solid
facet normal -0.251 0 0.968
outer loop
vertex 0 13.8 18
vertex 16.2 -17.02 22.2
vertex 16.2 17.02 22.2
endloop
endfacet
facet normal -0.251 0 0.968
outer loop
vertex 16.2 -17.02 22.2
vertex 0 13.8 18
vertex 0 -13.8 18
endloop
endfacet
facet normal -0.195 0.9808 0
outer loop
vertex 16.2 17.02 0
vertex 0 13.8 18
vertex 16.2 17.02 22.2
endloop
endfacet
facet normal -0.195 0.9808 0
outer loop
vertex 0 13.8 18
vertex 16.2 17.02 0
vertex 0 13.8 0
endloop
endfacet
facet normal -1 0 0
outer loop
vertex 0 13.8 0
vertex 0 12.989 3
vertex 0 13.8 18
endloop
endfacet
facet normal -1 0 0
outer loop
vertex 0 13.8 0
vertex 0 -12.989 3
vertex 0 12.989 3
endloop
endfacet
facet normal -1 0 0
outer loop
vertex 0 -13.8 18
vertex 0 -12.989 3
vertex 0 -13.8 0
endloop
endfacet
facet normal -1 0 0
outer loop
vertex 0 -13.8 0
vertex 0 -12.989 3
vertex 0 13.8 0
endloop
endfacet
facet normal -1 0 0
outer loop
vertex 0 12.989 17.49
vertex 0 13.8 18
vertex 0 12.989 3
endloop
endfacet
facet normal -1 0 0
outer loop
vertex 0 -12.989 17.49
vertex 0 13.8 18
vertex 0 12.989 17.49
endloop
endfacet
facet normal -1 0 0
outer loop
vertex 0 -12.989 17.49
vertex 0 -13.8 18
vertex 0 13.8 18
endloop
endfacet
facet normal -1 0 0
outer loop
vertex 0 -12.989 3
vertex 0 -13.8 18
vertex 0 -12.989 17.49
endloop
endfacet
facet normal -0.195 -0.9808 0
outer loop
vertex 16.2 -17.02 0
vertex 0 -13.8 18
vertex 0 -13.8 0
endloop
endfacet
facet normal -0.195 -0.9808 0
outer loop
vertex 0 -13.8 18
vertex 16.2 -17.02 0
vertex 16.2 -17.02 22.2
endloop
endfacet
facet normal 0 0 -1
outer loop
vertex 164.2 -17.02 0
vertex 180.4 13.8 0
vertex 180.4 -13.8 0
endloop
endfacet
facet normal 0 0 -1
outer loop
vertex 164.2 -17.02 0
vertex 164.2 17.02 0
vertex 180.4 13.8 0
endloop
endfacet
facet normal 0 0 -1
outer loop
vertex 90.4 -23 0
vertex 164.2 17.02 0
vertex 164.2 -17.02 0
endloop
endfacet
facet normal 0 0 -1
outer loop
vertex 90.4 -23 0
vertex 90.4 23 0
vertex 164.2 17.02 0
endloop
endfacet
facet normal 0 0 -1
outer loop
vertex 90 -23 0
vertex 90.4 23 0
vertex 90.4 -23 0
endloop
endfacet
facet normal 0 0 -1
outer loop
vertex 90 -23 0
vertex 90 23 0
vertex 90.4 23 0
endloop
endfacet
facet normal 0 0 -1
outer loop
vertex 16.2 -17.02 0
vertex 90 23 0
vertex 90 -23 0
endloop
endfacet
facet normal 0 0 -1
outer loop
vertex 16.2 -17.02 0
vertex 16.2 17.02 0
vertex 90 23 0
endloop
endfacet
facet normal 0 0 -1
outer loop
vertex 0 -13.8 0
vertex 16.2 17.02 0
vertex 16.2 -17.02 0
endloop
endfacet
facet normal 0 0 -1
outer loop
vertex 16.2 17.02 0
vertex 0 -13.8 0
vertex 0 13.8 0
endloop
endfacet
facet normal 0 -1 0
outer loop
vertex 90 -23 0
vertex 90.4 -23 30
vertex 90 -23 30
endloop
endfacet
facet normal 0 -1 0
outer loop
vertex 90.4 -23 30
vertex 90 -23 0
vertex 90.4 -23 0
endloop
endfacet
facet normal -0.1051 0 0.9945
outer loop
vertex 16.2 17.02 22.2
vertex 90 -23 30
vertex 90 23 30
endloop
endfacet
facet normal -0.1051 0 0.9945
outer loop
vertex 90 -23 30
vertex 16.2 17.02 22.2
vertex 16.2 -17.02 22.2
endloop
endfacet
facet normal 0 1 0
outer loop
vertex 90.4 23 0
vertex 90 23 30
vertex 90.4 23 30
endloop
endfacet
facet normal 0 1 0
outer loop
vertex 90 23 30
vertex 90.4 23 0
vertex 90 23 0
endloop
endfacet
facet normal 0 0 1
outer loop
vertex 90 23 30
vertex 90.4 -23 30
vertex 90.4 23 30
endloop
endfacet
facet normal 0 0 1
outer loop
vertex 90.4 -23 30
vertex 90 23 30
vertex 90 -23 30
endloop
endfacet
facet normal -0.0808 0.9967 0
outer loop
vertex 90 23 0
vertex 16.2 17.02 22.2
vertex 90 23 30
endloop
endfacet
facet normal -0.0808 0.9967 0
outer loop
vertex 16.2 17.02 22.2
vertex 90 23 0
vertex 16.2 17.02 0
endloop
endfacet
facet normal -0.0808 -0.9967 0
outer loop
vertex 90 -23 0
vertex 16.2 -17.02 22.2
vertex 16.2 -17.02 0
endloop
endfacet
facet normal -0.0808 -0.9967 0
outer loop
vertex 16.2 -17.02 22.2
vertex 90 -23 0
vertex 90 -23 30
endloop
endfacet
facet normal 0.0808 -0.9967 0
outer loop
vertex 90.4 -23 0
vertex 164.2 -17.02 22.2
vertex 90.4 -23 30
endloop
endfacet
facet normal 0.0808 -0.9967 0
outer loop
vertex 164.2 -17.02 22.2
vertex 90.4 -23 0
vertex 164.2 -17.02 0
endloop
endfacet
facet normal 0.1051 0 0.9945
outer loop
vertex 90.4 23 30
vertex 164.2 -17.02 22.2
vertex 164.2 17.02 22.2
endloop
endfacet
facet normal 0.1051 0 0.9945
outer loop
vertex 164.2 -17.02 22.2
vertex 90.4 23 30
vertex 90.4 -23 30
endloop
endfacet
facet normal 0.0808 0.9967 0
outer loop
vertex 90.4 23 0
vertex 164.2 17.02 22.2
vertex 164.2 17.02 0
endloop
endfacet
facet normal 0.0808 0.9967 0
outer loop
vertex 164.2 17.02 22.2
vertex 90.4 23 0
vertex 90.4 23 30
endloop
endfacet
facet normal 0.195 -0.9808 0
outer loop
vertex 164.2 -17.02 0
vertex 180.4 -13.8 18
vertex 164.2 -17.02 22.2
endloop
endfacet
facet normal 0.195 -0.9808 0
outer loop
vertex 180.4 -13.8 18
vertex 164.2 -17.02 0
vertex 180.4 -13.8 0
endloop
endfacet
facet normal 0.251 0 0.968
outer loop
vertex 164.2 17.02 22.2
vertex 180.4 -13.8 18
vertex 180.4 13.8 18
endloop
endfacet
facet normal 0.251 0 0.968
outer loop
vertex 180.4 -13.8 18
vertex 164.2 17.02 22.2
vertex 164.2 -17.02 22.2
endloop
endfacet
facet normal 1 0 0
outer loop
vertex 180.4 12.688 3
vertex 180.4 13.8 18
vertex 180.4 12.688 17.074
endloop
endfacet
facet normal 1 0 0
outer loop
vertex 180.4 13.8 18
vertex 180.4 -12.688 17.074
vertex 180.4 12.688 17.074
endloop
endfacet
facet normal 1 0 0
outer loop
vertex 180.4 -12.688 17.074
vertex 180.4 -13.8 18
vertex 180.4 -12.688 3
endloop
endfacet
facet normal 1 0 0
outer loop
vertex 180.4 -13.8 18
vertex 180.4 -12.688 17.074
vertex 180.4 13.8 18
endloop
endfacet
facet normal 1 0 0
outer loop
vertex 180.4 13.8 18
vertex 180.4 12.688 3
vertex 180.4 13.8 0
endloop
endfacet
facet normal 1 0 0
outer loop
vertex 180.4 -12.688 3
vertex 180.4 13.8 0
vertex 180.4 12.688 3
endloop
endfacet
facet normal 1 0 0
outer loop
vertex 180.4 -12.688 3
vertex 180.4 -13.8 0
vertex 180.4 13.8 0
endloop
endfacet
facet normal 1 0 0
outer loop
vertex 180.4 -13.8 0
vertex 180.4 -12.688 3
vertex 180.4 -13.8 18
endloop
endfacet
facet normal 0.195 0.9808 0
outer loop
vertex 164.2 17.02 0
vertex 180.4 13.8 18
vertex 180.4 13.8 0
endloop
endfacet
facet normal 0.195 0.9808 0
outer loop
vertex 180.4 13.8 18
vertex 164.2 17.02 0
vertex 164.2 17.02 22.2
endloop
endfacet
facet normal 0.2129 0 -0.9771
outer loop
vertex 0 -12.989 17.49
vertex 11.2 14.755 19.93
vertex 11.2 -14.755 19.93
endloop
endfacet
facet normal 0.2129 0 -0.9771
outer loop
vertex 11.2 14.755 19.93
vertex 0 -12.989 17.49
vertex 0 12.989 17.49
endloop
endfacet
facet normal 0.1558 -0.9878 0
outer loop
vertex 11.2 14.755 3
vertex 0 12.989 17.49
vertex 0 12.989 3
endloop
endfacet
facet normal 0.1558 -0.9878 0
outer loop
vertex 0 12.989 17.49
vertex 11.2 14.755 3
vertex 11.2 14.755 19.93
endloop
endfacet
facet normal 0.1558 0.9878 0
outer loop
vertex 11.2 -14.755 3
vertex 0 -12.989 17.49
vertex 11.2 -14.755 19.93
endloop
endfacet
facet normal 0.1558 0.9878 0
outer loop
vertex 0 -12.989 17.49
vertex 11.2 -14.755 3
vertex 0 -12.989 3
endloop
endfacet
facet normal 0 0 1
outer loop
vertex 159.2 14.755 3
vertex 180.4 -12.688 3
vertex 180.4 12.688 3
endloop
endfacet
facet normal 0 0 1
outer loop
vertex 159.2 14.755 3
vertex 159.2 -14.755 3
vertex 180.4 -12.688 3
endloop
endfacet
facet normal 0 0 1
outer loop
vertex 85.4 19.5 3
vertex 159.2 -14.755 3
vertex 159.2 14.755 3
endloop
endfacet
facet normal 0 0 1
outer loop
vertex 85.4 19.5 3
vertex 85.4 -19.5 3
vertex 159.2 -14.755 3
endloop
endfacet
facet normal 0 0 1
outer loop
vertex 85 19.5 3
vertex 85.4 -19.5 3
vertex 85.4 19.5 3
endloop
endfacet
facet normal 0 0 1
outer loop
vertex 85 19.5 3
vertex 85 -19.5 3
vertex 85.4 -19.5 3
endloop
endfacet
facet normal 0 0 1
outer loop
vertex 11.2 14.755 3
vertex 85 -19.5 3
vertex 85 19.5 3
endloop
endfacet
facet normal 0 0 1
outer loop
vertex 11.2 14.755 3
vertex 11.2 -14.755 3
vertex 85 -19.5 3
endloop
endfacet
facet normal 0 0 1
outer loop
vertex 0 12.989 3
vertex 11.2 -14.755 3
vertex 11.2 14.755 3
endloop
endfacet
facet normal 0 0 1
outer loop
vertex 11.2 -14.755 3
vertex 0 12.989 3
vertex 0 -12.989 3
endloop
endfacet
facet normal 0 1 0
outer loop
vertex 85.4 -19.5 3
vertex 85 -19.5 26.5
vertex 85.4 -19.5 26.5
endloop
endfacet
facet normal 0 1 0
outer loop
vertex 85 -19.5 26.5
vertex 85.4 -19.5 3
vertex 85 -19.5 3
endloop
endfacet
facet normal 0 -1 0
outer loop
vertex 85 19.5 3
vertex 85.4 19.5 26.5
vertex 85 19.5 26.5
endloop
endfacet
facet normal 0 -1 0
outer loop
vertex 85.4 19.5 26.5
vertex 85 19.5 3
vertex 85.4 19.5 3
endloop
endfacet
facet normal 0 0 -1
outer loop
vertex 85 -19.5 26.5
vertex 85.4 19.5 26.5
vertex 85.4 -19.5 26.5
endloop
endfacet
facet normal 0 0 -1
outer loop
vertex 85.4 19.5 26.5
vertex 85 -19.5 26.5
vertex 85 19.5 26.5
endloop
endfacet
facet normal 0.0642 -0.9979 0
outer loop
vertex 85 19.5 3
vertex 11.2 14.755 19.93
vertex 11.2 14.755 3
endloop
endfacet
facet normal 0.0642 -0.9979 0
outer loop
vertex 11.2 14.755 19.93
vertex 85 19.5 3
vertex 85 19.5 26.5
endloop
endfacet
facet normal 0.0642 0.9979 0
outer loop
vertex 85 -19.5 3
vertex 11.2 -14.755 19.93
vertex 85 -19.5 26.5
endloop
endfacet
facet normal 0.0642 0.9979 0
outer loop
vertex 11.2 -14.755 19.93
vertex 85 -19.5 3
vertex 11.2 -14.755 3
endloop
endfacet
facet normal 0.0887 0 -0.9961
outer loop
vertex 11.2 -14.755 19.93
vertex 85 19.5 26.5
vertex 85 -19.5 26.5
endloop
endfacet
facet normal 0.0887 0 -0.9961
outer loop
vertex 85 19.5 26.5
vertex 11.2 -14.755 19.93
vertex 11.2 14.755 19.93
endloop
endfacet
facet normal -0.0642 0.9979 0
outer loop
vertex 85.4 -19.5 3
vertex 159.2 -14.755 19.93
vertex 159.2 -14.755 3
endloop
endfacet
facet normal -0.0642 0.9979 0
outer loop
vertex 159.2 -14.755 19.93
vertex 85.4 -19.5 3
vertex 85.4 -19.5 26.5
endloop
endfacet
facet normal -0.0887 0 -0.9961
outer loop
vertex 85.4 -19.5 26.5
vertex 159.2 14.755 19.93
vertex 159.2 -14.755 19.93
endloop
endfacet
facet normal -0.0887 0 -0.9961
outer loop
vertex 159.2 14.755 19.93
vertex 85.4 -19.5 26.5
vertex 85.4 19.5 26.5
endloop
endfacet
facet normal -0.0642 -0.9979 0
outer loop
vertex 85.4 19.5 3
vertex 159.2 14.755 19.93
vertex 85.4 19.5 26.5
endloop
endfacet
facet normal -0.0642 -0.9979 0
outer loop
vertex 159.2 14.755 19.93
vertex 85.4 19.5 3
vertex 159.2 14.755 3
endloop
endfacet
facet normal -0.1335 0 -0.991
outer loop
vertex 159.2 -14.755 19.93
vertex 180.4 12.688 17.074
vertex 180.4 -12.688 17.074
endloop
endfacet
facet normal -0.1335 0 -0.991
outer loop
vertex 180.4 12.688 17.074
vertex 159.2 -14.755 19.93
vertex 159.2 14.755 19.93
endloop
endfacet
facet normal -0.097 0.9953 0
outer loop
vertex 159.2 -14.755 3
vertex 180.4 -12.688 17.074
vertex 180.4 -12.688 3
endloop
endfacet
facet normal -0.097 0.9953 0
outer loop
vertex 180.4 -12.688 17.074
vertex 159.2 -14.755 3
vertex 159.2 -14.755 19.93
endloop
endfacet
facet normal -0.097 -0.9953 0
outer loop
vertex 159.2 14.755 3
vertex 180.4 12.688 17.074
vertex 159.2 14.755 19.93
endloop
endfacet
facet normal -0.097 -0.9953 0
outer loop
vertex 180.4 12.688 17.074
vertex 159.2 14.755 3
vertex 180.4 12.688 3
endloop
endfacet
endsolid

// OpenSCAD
$fn = 32;

// ----------------------------------------------------------------------
// Faired channel: 180 x 46 x 30 mm, 3.5 mm walls, faired ends
// ----------------------------------------------------------------------

// --- parameters (mm) ---
length = 180;             // channel length
width = 46;               // channel width at mid length
height = 30;              // channel height at mid length
wall = 3.5;               // side wall thickness
floor_t = 3;              // floor thickness
end_w = 27.6;             // faired end width
end_h = 18;               // faired end height

difference() {
  union() {
    hull() {
      translate([0, -13.8, 0]) cube([0.4, 27.6, 18]);
      translate([16.2, -17.02, 0]) cube([0.4, 34.04, 22.2]);
    }
    hull() {
      translate([16.2, -17.02, 0]) cube([0.4, 34.04, 22.2]);
      translate([90, -23, 0]) cube([0.4, 46, 30]);
    }
    hull() {
      translate([90, -23, 0]) cube([0.4, 46, 30]);
      translate([163.8, -17.02, 0]) cube([0.4, 34.04, 22.2]);
    }
    hull() {
      translate([163.8, -17.02, 0]) cube([0.4, 34.04, 22.2]);
      translate([180, -13.8, 0]) cube([0.4, 27.6, 18]);
    }
  }
  /* cavity, 5 mm proud of both ends so the ports are cut clean */
  hull() {
    translate([-5, -12.2, 3]) cube([0.4, 24.4, 13.4]);
    translate([11.2, -14.755, 3]) cube([0.4, 29.51, 16.93]);
  }
  hull() {
    translate([11.2, -14.755, 3]) cube([0.4, 29.51, 16.93]);
    translate([85, -19.5, 3]) cube([0.4, 39, 23.5]);
  }
  hull() {
    translate([85, -19.5, 3]) cube([0.4, 39, 23.5]);
    translate([158.8, -14.755, 3]) cube([0.4, 29.51, 16.93]);
  }
  hull() {
    translate([158.8, -14.755, 3]) cube([0.4, 29.51, 16.93]);
    translate([185, -12.2, 3]) cube([0.4, 24.4, 13.4]);
  }
}
